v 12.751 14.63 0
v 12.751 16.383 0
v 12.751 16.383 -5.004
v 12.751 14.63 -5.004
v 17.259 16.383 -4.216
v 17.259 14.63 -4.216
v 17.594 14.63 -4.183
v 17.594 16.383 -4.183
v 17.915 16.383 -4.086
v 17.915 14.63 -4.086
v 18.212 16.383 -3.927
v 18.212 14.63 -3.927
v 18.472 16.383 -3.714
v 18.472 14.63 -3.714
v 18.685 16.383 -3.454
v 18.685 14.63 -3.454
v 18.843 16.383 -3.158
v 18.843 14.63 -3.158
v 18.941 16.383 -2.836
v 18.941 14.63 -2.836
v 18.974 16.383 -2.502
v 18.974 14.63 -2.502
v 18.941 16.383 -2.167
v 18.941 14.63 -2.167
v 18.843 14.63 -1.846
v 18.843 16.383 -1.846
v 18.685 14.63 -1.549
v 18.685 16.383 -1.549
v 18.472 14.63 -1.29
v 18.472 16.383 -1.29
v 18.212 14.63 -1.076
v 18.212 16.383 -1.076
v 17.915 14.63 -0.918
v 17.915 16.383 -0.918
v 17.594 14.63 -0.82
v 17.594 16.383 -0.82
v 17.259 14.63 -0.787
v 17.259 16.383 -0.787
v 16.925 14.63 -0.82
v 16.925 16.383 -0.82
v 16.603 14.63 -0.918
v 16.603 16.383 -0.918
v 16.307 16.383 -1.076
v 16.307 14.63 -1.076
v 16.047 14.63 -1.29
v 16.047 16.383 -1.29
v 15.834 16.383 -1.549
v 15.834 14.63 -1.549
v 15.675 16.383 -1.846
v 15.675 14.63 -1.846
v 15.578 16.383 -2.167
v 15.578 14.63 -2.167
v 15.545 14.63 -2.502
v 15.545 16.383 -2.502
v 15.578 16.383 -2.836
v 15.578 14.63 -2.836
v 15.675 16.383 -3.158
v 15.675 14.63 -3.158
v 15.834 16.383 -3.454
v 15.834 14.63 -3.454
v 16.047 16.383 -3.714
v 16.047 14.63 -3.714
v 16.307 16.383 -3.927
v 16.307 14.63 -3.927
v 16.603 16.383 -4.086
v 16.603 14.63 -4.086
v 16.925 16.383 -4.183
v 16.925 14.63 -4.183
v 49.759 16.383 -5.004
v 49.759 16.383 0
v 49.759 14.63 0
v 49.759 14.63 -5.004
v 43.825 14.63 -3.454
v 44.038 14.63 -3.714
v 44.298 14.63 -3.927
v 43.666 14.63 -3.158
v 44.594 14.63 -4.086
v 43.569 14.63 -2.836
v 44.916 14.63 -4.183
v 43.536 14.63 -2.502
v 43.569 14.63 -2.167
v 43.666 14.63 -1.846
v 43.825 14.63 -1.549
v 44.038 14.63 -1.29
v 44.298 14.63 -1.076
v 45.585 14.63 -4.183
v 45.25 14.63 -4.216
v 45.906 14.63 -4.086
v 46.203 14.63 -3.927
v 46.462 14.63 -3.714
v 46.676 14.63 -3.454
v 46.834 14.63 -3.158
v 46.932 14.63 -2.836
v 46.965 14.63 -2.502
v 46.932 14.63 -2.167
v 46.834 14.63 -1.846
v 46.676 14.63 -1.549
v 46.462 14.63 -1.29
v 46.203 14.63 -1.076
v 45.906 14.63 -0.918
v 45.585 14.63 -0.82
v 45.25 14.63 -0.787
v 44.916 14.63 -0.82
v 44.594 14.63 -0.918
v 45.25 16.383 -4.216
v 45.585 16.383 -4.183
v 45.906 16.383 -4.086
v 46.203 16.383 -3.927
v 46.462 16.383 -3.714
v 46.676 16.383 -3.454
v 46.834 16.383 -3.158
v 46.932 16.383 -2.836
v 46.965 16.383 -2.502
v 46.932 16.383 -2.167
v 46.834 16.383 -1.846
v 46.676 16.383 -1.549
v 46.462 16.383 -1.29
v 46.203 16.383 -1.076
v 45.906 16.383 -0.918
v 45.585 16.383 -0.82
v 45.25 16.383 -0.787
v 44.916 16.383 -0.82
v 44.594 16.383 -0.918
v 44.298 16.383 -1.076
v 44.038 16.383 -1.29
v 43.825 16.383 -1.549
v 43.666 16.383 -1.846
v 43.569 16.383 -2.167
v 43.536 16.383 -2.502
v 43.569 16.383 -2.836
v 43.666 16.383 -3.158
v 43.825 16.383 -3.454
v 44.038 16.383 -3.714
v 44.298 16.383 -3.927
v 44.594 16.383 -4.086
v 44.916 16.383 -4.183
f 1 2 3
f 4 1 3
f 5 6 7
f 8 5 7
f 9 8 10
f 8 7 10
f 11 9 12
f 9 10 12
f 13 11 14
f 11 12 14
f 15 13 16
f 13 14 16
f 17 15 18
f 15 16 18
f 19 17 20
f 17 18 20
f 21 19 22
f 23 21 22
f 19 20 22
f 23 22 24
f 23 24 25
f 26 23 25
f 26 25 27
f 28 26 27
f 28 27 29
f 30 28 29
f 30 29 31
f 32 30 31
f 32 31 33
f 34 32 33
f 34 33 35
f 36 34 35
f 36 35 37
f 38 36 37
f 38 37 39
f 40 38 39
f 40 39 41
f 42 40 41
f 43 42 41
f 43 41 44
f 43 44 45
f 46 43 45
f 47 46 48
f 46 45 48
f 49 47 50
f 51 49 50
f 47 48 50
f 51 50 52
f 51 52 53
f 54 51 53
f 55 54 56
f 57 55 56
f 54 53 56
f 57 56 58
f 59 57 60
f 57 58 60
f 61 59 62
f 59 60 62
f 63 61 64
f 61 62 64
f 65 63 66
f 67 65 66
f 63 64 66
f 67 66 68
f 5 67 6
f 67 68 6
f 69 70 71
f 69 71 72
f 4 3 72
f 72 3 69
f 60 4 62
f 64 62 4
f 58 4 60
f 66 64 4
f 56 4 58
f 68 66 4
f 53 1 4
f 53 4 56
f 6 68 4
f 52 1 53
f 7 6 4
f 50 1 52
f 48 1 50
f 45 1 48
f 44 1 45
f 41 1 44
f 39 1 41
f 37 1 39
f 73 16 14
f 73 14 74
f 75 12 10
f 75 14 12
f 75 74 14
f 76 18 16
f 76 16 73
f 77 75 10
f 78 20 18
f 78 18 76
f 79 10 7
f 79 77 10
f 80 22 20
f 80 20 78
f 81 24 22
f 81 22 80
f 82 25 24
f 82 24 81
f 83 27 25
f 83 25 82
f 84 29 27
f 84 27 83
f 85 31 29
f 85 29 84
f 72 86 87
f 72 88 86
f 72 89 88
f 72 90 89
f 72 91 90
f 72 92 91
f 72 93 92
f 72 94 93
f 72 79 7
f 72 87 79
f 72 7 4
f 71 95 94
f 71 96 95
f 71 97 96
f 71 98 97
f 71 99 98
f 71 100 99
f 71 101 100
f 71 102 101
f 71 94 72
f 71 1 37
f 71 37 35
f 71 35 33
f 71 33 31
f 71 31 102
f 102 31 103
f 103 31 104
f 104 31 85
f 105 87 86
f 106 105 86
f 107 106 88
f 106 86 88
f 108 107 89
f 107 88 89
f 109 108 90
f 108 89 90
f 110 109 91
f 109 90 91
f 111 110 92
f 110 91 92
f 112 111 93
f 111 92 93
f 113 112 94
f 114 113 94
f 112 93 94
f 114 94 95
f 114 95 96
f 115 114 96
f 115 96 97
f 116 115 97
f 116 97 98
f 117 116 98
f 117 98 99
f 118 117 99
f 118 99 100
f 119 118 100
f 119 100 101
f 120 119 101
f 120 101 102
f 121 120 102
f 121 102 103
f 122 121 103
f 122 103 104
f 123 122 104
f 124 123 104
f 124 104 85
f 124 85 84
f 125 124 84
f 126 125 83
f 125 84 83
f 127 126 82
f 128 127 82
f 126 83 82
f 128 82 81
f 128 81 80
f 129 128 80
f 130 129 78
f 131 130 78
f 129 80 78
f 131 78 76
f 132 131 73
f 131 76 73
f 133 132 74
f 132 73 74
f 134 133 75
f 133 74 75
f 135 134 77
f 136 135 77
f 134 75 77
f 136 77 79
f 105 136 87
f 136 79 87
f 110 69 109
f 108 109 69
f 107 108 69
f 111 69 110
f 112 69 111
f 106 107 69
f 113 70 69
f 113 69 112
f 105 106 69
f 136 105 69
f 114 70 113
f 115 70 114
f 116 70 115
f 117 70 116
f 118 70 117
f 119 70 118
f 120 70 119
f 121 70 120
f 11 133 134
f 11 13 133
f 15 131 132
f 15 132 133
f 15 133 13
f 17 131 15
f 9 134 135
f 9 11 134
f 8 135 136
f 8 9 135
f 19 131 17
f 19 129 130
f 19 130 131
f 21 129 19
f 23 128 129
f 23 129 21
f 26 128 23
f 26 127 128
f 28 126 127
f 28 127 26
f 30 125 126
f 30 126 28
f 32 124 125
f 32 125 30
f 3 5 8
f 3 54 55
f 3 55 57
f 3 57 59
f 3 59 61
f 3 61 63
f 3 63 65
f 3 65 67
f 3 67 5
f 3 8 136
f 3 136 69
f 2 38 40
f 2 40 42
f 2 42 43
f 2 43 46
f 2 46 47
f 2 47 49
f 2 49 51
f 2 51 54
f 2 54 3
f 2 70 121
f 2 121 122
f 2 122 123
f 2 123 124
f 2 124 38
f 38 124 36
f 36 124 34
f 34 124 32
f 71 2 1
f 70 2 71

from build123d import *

# Parameters (mm, degrees)
BOSS_EXTRUDE1_DEPTH = 25.654
SKETCH2_W           = 20.6502
SKETCH2_H           = 12.3952
CUT_EXTRUDE1_DEPTH  = 63.010623853
SKETCH3_W           = 42.037
SKETCH3_H           = 20.6502
CUT_EXTRUDE2_DEPTH  = 62.078275718
CUT_EXTRUDE3_DEPTH  = 5.08
SKETCH5_R           = 1.0795
CUT_EXTRUDE4_DEPTH  = 62.078275718
SKETCH6_R           = 1.7145
CUT_EXTRUDE5_DEPTH  = 63.010623853
SKETCH7_W           = 13.199565881
SKETCH7_H           = 28.375595839
SKETCH7_W_2         = 9.485915606
CUT_EXTRUDE6_DEPTH  = 63.010623853
SKETCH8_W           = 38.481
SKETCH8_H           = 14.6304
CUT_EXTRUDE7_DEPTH  = 59.330512418
SKETCH9_W           = 1.4732
SKETCH9_H           = 5.0038
CUT_EXTRUDE8_DEPTH  = 2.54


with BuildPart() as part:
    # Sketch1 → Boss-Extrude1 (new body)
    with BuildSketch(Plane.XY):
        with BuildLine():
            Line((0, 0), (54.0258, 0))
            Line((54.0258, 0), (54.0258, 3.9878))
            Line((54.0258, 3.9878), (51.176616962, 11.038320738))
            ThreePointArc((51.176616962, 11.038320738), (51.065947457, 11.411860999), (51.0286, 11.799656349))
            Line((51.0286, 11.799656349), (51.0286, 15.113))
            Line((51.0286, 15.113), (49.7586, 16.383))
            Line((49.7586, 16.383), (11.2776, 16.383))
            Line((11.2776, 16.383), (10.0076, 15.113))
            Line((10.0076, 15.113), (10.0076, 12.427861529))
            ThreePointArc((10.0076, 12.427861529), (9.790474401, 11.513938717), (9.185498713, 10.795326965))
            Line((9.185498713, 10.795326965), (0, 3.9878))
            Line((0, 3.9878), (0, 0))
        make_face()
    extrude(amount=-BOSS_EXTRUDE1_DEPTH)

    # Sketch2 → Cut-Extrude1 (cut, through all)
    with BuildSketch(Plane(origin=(54.0258, 0, 0), x_dir=(0, 0, -1), z_dir=(1, 0, 0))):
        with Locations((15.3289, 10.1854)):
            Rectangle(SKETCH2_W, SKETCH2_H)
    extrude(amount=-CUT_EXTRUDE1_DEPTH, mode=Mode.SUBTRACT)

    # Sketch3 → Cut-Extrude2 (cut, through all)
    with BuildSketch(Plane(origin=(0, 3.9878, 0), x_dir=(1, 0, 0), z_dir=(0, 1, 0))):
        with Locations((27.0129, 15.3289)):
            Rectangle(SKETCH3_W, SKETCH3_H)
    extrude(amount=-CUT_EXTRUDE2_DEPTH, mode=Mode.SUBTRACT)

    # Sketch4 → Cut-Extrude3 (cut)
    with BuildSketch(Plane.XY):
        with BuildLine():
            Line((6.901956547, 3.937), (10.414, 3.937))
            ThreePointArc((10.414, 3.937), (11.473670222, 4.375929778), (11.9126, 5.4356))
            Line((11.9126, 5.4356), (11.9126, 8.038434234))
            ThreePointArc((11.9126, 8.038434234), (11.088018074, 9.376904105), (9.521699699, 9.242428475))
            Line((9.521699699, 9.242428475), (6.009656246, 6.639594241))
            ThreePointArc((6.009656246, 6.639594241), (5.478912674, 4.965761629), (6.901956547, 3.937))
        make_face()
        with BuildLine():
            Line((47.752, 13.9446), (42.6212, 13.9446))
            ThreePointArc((42.6212, 13.9446), (41.561529778, 13.505670222), (41.1226, 12.446))
            Line((41.1226, 12.446), (41.1226, 5.4356))
            ThreePointArc((41.1226, 5.4356), (41.561529778, 4.375929778), (42.6212, 3.937))
            Line((42.6212, 3.937), (47.752, 3.937))
            ThreePointArc((47.752, 3.937), (48.811670222, 4.375929778), (49.2506, 5.4356))
            Line((49.2506, 5.4356), (49.2506, 12.446))
            ThreePointArc((49.2506, 12.446), (48.811670222, 13.505670222), (47.752, 13.9446))
        make_face()
        with BuildLine():
            Line((13.3096, 12.446), (13.3096, 5.4356))
            ThreePointArc((13.3096, 5.4356), (13.748529778, 4.375929778), (14.8082, 3.937))
            Line((14.8082, 3.937), (19.939, 3.937))
            ThreePointArc((19.939, 3.937), (20.998670222, 4.375929778), (21.4376, 5.4356))
            Line((21.4376, 5.4356), (21.4376, 12.446))
            ThreePointArc((21.4376, 12.446), (20.998670222, 13.505670222), (19.939, 13.9446))
            Line((19.939, 13.9446), (14.8082, 13.9446))
            ThreePointArc((14.8082, 13.9446), (13.748529778, 13.505670222), (13.3096, 12.446))
        make_face()
        with BuildLine():
            Line((22.8346, 12.446), (22.8346, 5.4356))
            ThreePointArc((22.8346, 5.4356), (23.273529778, 4.375929778), (24.3332, 3.937))
            Line((24.3332, 3.937), (38.227, 3.937))
            ThreePointArc((38.227, 3.937), (39.286670222, 4.375929778), (39.7256, 5.4356))
            Line((39.7256, 5.4356), (39.7256, 12.446))
            ThreePointArc((39.7256, 12.446), (39.286670222, 13.505670222), (38.227, 13.9446))
            Line((38.227, 13.9446), (24.3332, 13.9446))
            ThreePointArc((24.3332, 13.9446), (23.273529778, 13.505670222), (22.8346, 12.446))
        make_face()
    extrude(amount=-CUT_EXTRUDE3_DEPTH, mode=Mode.SUBTRACT)

    # Sketch5 → Cut-Extrude4 (cut, through all)
    with BuildSketch(Plane(origin=(0, 3.9878, 0), x_dir=(1, 0, 0), z_dir=(0, 1, 0))):
        with Locations(Location((51.0286, 21.336, 0), (0, 0, 270))):
            Circle(SKETCH5_R)
        with Locations(Location((51.0286, 11.3538, 0), (0, 0, 270))):
            Circle(SKETCH5_R)
        with Locations(Location((2.9972, 11.3538, 0), (0, 0, 90))):
            Circle(SKETCH5_R)
        with Locations(Location((2.9972, 21.336, 0), (0, 0, 90))):
            Circle(SKETCH5_R)
    extrude(amount=-CUT_EXTRUDE4_DEPTH, mode=Mode.SUBTRACT)

    # Sketch6 → Cut-Extrude5 (cut, through all)
    with BuildSketch(Plane.XZ):
        with Locations(Location((45.2501, -2.5019, 0), (0, 0, 270))):
            Circle(SKETCH6_R)
        with Locations(Location((17.2593, -2.5019, 0), (0, 0, 270))):
            Circle(SKETCH6_R)
    extrude(amount=-CUT_EXTRUDE5_DEPTH, mode=Mode.SUBTRACT)

    # Sketch7 → Cut-Extrude6 (cut, through all)
    with BuildSketch(Plane(origin=(0, 16.383, 0), x_dir=(1, 0, 0), z_dir=(0, 1, 0))):
        with Locations((4.67781706, 13.121352654)):
            Rectangle(SKETCH7_W, SKETCH7_H)
        with Locations((54.501557803, 13.121352654)):
            Rectangle(SKETCH7_W_2, SKETCH7_H)
    extrude(amount=-CUT_EXTRUDE6_DEPTH, mode=Mode.SUBTRACT)

    # Sketch8 → Cut-Extrude7 (cut, through all)
    with BuildSketch(Plane.XY):
        with Locations((30.5181, 7.3152)):
            Rectangle(SKETCH8_W, SKETCH8_H)
    extrude(amount=-CUT_EXTRUDE7_DEPTH, mode=Mode.SUBTRACT)

    # Sketch9 → Cut-Extrude8 (cut)
    with BuildSketch(Plane(origin=(0, 16.383, 0), x_dir=(1, 0, 0), z_dir=(0, 1, 0))):
        with Locations((12.0142, 2.5019)):
            Rectangle(SKETCH9_W, SKETCH9_H)
    extrude(amount=-CUT_EXTRUDE8_DEPTH, mode=Mode.SUBTRACT)


solid = part.part
